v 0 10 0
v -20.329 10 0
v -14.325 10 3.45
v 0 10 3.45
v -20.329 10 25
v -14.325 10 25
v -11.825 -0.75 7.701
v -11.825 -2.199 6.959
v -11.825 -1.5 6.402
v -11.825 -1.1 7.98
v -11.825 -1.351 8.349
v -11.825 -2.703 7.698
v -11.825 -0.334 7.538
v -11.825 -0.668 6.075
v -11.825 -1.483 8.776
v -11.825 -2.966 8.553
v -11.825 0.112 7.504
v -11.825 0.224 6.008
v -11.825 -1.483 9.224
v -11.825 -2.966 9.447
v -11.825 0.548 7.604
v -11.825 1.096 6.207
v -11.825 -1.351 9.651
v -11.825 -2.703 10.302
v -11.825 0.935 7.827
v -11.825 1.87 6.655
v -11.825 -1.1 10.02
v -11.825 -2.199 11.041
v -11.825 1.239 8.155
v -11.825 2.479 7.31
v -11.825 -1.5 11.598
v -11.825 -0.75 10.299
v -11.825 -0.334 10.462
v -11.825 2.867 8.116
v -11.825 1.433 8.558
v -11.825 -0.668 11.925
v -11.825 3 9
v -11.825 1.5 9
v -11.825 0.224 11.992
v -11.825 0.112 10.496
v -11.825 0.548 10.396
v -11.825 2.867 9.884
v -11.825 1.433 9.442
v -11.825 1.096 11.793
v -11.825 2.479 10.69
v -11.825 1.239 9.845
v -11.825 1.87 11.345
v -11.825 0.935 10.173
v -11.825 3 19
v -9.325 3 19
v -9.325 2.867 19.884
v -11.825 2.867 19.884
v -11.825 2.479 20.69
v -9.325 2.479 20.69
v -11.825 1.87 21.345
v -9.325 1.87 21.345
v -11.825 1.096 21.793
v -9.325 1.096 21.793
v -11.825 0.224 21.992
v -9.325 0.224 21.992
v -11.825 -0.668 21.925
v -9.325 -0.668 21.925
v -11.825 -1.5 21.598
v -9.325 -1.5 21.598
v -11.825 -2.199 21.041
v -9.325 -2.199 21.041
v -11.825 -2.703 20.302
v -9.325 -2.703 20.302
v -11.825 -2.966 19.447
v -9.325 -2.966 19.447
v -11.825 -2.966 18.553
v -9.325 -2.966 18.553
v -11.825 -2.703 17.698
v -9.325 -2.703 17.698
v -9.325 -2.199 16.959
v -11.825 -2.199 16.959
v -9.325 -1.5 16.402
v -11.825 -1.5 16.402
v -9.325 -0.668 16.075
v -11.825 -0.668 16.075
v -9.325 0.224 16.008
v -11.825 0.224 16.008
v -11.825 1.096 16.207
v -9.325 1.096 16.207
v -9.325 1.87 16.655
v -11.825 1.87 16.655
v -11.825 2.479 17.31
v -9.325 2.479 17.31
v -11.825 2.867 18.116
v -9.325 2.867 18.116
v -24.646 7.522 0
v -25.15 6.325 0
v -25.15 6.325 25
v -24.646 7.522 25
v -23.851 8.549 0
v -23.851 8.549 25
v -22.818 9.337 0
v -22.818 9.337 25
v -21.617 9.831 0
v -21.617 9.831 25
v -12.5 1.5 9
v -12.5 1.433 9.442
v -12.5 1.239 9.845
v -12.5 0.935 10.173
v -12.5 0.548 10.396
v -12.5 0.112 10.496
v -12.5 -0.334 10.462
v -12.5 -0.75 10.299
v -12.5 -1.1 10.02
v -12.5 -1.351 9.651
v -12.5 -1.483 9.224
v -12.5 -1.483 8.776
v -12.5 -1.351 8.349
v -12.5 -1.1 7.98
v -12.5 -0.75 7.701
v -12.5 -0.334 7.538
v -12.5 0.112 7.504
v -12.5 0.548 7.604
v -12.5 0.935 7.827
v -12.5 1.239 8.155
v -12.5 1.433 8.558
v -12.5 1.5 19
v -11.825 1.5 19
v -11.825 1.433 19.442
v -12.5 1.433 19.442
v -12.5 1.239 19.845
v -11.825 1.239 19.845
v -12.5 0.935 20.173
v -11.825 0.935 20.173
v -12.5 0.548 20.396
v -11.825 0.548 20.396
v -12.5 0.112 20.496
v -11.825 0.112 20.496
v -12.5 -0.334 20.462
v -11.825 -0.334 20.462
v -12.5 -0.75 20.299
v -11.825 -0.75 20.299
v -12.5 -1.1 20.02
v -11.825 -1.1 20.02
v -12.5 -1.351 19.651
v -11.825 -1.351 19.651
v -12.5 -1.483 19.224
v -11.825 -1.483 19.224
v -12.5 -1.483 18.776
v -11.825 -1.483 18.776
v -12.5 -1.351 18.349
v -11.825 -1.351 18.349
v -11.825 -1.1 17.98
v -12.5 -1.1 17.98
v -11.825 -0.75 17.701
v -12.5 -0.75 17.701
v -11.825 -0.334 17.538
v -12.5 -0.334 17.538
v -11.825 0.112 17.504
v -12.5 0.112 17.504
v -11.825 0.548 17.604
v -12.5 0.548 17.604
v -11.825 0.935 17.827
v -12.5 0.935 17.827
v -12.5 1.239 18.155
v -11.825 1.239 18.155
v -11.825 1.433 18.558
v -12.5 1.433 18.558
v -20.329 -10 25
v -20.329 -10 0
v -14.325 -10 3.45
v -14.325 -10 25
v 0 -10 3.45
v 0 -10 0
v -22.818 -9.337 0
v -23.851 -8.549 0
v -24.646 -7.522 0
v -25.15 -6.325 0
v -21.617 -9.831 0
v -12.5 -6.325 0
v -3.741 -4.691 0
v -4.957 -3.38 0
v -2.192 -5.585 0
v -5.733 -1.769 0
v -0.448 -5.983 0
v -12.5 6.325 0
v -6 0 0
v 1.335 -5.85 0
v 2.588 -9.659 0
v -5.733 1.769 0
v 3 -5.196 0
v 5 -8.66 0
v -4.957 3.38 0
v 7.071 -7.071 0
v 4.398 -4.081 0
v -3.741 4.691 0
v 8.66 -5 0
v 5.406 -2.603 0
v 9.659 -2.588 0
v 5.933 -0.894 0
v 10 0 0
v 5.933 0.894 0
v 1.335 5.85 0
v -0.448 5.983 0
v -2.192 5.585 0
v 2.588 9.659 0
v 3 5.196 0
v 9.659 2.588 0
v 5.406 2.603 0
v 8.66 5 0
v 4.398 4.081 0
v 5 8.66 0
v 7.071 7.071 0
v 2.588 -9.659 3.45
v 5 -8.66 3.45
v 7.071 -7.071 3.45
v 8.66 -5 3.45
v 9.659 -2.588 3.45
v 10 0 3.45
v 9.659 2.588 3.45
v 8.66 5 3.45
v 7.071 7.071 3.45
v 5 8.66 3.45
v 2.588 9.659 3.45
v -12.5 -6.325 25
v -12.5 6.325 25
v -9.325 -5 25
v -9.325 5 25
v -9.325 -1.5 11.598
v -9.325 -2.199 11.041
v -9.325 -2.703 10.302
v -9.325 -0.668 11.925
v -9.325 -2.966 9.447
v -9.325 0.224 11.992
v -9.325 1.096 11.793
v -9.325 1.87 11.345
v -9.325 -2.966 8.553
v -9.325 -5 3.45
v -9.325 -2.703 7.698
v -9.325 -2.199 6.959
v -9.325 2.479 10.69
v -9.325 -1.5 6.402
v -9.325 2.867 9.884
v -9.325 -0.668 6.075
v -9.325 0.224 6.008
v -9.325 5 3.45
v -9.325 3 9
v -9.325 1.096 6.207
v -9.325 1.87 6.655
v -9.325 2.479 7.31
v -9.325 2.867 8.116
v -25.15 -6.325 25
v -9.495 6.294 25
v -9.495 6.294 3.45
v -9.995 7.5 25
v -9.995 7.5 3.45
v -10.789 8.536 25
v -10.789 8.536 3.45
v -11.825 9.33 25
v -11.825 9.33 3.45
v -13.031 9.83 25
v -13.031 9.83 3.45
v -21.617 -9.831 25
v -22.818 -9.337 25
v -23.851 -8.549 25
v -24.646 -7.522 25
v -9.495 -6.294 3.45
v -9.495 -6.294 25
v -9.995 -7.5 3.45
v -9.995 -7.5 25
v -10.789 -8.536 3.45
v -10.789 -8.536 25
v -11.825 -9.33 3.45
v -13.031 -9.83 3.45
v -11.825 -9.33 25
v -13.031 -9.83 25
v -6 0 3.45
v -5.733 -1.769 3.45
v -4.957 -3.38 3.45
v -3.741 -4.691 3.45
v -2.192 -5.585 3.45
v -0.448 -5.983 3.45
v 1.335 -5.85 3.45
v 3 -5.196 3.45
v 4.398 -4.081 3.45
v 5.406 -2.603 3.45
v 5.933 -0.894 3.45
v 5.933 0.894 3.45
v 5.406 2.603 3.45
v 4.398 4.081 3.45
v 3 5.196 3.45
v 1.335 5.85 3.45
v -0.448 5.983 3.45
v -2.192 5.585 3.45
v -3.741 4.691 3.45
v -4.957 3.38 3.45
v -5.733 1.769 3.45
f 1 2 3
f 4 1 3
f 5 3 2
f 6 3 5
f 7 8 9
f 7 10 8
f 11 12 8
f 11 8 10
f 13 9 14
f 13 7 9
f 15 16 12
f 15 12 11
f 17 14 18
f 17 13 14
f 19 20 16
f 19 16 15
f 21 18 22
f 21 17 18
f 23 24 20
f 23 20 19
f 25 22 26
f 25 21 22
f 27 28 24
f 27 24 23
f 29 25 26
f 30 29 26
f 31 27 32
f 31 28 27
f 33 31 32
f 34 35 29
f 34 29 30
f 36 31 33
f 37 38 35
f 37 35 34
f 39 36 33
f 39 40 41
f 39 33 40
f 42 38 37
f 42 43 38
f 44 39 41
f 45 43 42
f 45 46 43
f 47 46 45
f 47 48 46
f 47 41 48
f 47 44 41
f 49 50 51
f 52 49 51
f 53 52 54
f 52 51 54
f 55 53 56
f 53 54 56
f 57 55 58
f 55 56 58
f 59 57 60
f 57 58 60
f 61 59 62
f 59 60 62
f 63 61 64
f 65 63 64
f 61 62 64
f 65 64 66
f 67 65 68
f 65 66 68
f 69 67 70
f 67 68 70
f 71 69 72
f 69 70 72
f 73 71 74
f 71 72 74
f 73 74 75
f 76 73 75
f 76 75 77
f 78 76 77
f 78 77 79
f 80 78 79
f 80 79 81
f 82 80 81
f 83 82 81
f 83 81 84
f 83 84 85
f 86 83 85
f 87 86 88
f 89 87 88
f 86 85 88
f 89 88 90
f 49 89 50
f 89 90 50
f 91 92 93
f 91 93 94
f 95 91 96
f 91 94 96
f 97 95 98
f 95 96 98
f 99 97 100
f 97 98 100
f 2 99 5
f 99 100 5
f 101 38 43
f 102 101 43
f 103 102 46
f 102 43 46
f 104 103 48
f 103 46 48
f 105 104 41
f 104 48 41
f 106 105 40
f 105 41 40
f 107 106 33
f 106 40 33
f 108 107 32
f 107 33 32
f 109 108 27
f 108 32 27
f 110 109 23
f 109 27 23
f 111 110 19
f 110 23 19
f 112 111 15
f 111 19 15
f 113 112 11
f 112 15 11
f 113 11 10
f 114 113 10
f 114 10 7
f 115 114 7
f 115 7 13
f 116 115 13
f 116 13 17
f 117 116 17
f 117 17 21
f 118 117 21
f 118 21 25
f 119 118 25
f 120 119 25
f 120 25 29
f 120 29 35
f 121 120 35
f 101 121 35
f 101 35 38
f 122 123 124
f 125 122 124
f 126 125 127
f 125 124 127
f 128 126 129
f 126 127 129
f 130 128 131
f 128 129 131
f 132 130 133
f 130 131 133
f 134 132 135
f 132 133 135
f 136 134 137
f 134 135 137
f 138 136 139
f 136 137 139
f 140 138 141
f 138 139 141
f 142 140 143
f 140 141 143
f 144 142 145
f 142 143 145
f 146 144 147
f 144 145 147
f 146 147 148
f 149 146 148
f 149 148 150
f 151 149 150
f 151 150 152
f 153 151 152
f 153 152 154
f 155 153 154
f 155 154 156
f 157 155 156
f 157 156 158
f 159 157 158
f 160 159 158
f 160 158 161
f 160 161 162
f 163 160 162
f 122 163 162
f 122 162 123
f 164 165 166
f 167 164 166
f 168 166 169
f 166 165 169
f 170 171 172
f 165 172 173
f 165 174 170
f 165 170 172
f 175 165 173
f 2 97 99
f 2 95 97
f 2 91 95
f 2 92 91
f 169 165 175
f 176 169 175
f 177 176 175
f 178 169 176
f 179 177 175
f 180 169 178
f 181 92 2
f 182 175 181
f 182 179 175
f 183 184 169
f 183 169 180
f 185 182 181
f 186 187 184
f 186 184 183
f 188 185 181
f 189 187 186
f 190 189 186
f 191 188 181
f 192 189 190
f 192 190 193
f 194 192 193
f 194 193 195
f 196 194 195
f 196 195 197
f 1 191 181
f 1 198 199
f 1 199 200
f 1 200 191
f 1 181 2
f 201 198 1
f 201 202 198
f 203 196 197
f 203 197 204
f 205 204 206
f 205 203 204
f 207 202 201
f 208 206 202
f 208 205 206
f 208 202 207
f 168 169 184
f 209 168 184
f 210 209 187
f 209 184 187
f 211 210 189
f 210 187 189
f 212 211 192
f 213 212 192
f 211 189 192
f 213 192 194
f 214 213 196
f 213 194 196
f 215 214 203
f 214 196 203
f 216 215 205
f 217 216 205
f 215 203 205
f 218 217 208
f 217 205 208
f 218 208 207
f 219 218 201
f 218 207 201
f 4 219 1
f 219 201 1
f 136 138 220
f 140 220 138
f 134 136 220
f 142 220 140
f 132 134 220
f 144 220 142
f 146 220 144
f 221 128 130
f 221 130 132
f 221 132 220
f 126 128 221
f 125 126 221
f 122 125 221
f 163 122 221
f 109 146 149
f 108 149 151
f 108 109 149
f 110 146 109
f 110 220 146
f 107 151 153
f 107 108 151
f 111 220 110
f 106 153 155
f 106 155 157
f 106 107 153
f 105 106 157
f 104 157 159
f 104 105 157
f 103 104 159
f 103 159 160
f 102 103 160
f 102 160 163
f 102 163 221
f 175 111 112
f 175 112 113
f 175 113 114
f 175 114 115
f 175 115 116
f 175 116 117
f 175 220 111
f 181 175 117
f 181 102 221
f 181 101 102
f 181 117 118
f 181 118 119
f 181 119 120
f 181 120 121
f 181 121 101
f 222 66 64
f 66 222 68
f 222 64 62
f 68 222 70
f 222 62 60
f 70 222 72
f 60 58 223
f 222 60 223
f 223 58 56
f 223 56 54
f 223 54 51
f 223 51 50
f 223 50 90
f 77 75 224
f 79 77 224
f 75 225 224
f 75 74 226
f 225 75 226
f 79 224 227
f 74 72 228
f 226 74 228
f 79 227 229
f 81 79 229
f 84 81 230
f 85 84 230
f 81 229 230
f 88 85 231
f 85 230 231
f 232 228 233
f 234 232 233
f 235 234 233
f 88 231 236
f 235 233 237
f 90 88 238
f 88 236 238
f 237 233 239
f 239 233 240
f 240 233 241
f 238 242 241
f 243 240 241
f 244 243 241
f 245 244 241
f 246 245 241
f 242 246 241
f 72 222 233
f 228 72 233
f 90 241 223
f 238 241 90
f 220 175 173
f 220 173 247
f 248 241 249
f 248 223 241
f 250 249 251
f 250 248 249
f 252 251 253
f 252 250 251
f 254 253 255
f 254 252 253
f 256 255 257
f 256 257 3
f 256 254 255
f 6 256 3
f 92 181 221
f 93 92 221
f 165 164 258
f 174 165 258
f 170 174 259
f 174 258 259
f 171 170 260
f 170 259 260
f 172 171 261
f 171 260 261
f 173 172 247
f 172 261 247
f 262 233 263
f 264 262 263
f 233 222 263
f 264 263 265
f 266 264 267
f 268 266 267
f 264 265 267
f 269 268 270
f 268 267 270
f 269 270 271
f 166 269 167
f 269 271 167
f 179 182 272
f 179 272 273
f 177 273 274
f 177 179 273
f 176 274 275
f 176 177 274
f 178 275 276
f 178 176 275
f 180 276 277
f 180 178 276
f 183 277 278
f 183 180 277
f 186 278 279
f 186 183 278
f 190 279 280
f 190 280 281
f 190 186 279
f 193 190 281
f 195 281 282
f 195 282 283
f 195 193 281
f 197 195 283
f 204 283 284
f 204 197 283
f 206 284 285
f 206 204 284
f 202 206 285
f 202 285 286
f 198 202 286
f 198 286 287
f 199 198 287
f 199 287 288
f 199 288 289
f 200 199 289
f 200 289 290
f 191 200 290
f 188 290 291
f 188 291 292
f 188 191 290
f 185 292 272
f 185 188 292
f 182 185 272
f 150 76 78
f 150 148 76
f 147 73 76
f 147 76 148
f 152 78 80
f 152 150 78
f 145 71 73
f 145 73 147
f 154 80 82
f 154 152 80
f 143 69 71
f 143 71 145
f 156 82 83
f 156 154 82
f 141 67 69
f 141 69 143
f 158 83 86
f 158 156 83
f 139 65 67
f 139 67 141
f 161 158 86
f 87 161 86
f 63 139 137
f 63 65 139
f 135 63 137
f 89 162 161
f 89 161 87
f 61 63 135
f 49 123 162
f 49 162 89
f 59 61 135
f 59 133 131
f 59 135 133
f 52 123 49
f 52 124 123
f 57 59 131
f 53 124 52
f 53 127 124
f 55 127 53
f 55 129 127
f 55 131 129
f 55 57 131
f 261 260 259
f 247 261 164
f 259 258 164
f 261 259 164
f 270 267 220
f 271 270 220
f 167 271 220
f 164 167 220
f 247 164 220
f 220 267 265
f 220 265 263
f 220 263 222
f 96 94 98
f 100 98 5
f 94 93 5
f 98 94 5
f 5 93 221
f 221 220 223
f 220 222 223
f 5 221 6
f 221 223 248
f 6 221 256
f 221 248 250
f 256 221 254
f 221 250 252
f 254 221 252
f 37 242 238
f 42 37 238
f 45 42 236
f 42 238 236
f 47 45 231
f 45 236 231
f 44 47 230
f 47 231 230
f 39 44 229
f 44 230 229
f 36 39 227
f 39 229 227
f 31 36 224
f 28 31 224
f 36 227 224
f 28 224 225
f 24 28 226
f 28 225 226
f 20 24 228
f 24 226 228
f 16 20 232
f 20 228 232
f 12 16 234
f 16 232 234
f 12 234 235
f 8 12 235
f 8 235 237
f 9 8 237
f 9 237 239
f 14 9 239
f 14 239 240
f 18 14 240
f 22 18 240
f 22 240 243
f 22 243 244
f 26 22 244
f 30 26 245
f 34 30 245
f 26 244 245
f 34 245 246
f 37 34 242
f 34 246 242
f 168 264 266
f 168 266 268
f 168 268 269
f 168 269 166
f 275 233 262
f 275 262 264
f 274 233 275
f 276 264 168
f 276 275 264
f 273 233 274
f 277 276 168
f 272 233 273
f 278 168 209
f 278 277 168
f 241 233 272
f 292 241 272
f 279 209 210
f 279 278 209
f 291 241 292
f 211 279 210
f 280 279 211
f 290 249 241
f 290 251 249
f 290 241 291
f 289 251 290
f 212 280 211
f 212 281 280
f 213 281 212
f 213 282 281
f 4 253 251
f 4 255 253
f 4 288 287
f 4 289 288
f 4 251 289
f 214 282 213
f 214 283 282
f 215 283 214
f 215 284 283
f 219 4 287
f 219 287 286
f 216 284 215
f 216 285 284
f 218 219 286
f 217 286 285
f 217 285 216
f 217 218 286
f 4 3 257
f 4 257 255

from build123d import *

# Parameters (mm, degrees)
SKETCH1_R           = 6
BOSS_EXTRUDE1_DEPTH = 3.45
SKETCH2_W           = 3.175
SKETCH2_H           = 20
BOSS_EXTRUDE2_DEPTH = 21.55
SKETCH3_W           = 25
SKETCH3_H           = 3.675
BOSS_EXTRUDE3_DEPTH = 12.65
FILLET1_R           = 5
SKETCH5_R           = 1.5
CUT_EXTRUDE1_DEPTH  = 12.65
SKETCH6_R           = 3
CUT_EXTRUDE2_DEPTH  = 2.5
FILLET2_R           = 5


with BuildPart() as part:
    # Sketch1 → Boss-Extrude1 (new body)
    with BuildSketch(Plane.XY):
        with BuildLine():
            Line((0, 10), (-12.5, 10))
            Line((-12.5, 10), (-12.5, -10))
            Line((-12.5, -10), (0, -10))
            ThreePointArc((0, -10), (10, 0), (0, 10))
        make_face()
        with Locations(Location((0, 0, 0), (0, 0, 180))):
            Circle(SKETCH1_R, mode=Mode.SUBTRACT)
    extrude(amount=BOSS_EXTRUDE1_DEPTH)

    # Sketch2 → Boss-Extrude2 (add)
    with BuildSketch(Plane.XY.offset(3.45)):
        with Locations((-10.9125, 0)):
            Rectangle(SKETCH2_W, SKETCH2_H)
    extrude(amount=BOSS_EXTRUDE2_DEPTH)

    # Sketch3 → Boss-Extrude3 (add)
    with BuildSketch(Plane.ZY.offset(12.5)):
        with Locations((12.5, 8.1625)):
            Rectangle(SKETCH3_W, SKETCH3_H)
        with Locations((12.5, -8.1625)):
            Rectangle(SKETCH3_W, SKETCH3_H)
    extrude(amount=BOSS_EXTRUDE3_DEPTH)

    # Fillet1
    fillet1_edges = [part.edges().sort_by_distance(p)[0] for p in [
        (-9.325, 10, 14.225),
        (-9.325, -10, 14.225),
    ]]
    fillet(fillet1_edges, radius=FILLET1_R)

    # Sketch5 → Cut-Extrude1 (cut)
    with BuildSketch(Plane(origin=(-9.325, 0, 0), x_dir=(0, 0, -1), z_dir=(1, 0, 0))):
        with Locations(Location((-19, 0, 0), (0, 0, 90))):
            Circle(SKETCH5_R)
        with Locations(Location((-9, 0, 0), (0, 0, 90))):
            Circle(SKETCH5_R)
    extrude(amount=-CUT_EXTRUDE1_DEPTH, mode=Mode.SUBTRACT)

    # Sketch6 → Cut-Extrude2 (cut)
    with BuildSketch(Plane(origin=(-9.325, 0, 0), x_dir=(0, 0, -1), z_dir=(1, 0, 0))):
        with Locations(Location((-19, 0, 0), (0, 0, 90))):
            Circle(SKETCH6_R)
        with Locations(Location((-9, 0, 0), (0, 0, 90))):
            Circle(SKETCH6_R)
    extrude(amount=-CUT_EXTRUDE2_DEPTH, mode=Mode.SUBTRACT)

    # Fillet2
    # the kernel refuses this fillet: 5 mm, written as the material it takes off along each edge
    with BuildSketch(Plane(origin=(-25.15, 10, 37.05310515), x_dir=(1, 0, 0), z_dir=(0, 0, -1))) as fillet2_piece_1:
        with BuildLine():
            CenterArc((4.82124206, 5), FILLET2_R, 195.366952798, 74.633047202)
            Line((0, 3.675), (-0.096424841, 3.6485))
            ThreePointArc((-0.096424841, 3.6485), (-0.1, 1.8375), (-0.1, 0))
            Line((-0.1, 0), (0, -0.1))
            Line((0, -0.1), (4.82124206, -0.1))
            Line((4.82124206, -0.1), (4.82124206, 0))
        make_face()
    extrude(amount=49.106210299, mode=Mode.SUBTRACT)
    with BuildSketch(Plane(origin=(-25.15, -10, 37.05310515), x_dir=(1, 0, 0), z_dir=(0, 0, -1))) as fillet2_piece_2:
        with BuildLine():
            CenterArc((4.82124206, -5), FILLET2_R, 90, 74.633047202)
            Line((0, -3.675), (-0.096424841, -3.6485))
            ThreePointArc((-0.096424841, -3.6485), (-0.1, -1.8375), (-0.1, 0))
            Line((-0.1, 0), (0, 0.1))
            Line((0, 0.1), (4.82124206, 0.1))
            Line((4.82124206, 0.1), (4.82124206, 0))
        make_face()
    extrude(amount=49.106210299, mode=Mode.SUBTRACT)


solid = part.part
